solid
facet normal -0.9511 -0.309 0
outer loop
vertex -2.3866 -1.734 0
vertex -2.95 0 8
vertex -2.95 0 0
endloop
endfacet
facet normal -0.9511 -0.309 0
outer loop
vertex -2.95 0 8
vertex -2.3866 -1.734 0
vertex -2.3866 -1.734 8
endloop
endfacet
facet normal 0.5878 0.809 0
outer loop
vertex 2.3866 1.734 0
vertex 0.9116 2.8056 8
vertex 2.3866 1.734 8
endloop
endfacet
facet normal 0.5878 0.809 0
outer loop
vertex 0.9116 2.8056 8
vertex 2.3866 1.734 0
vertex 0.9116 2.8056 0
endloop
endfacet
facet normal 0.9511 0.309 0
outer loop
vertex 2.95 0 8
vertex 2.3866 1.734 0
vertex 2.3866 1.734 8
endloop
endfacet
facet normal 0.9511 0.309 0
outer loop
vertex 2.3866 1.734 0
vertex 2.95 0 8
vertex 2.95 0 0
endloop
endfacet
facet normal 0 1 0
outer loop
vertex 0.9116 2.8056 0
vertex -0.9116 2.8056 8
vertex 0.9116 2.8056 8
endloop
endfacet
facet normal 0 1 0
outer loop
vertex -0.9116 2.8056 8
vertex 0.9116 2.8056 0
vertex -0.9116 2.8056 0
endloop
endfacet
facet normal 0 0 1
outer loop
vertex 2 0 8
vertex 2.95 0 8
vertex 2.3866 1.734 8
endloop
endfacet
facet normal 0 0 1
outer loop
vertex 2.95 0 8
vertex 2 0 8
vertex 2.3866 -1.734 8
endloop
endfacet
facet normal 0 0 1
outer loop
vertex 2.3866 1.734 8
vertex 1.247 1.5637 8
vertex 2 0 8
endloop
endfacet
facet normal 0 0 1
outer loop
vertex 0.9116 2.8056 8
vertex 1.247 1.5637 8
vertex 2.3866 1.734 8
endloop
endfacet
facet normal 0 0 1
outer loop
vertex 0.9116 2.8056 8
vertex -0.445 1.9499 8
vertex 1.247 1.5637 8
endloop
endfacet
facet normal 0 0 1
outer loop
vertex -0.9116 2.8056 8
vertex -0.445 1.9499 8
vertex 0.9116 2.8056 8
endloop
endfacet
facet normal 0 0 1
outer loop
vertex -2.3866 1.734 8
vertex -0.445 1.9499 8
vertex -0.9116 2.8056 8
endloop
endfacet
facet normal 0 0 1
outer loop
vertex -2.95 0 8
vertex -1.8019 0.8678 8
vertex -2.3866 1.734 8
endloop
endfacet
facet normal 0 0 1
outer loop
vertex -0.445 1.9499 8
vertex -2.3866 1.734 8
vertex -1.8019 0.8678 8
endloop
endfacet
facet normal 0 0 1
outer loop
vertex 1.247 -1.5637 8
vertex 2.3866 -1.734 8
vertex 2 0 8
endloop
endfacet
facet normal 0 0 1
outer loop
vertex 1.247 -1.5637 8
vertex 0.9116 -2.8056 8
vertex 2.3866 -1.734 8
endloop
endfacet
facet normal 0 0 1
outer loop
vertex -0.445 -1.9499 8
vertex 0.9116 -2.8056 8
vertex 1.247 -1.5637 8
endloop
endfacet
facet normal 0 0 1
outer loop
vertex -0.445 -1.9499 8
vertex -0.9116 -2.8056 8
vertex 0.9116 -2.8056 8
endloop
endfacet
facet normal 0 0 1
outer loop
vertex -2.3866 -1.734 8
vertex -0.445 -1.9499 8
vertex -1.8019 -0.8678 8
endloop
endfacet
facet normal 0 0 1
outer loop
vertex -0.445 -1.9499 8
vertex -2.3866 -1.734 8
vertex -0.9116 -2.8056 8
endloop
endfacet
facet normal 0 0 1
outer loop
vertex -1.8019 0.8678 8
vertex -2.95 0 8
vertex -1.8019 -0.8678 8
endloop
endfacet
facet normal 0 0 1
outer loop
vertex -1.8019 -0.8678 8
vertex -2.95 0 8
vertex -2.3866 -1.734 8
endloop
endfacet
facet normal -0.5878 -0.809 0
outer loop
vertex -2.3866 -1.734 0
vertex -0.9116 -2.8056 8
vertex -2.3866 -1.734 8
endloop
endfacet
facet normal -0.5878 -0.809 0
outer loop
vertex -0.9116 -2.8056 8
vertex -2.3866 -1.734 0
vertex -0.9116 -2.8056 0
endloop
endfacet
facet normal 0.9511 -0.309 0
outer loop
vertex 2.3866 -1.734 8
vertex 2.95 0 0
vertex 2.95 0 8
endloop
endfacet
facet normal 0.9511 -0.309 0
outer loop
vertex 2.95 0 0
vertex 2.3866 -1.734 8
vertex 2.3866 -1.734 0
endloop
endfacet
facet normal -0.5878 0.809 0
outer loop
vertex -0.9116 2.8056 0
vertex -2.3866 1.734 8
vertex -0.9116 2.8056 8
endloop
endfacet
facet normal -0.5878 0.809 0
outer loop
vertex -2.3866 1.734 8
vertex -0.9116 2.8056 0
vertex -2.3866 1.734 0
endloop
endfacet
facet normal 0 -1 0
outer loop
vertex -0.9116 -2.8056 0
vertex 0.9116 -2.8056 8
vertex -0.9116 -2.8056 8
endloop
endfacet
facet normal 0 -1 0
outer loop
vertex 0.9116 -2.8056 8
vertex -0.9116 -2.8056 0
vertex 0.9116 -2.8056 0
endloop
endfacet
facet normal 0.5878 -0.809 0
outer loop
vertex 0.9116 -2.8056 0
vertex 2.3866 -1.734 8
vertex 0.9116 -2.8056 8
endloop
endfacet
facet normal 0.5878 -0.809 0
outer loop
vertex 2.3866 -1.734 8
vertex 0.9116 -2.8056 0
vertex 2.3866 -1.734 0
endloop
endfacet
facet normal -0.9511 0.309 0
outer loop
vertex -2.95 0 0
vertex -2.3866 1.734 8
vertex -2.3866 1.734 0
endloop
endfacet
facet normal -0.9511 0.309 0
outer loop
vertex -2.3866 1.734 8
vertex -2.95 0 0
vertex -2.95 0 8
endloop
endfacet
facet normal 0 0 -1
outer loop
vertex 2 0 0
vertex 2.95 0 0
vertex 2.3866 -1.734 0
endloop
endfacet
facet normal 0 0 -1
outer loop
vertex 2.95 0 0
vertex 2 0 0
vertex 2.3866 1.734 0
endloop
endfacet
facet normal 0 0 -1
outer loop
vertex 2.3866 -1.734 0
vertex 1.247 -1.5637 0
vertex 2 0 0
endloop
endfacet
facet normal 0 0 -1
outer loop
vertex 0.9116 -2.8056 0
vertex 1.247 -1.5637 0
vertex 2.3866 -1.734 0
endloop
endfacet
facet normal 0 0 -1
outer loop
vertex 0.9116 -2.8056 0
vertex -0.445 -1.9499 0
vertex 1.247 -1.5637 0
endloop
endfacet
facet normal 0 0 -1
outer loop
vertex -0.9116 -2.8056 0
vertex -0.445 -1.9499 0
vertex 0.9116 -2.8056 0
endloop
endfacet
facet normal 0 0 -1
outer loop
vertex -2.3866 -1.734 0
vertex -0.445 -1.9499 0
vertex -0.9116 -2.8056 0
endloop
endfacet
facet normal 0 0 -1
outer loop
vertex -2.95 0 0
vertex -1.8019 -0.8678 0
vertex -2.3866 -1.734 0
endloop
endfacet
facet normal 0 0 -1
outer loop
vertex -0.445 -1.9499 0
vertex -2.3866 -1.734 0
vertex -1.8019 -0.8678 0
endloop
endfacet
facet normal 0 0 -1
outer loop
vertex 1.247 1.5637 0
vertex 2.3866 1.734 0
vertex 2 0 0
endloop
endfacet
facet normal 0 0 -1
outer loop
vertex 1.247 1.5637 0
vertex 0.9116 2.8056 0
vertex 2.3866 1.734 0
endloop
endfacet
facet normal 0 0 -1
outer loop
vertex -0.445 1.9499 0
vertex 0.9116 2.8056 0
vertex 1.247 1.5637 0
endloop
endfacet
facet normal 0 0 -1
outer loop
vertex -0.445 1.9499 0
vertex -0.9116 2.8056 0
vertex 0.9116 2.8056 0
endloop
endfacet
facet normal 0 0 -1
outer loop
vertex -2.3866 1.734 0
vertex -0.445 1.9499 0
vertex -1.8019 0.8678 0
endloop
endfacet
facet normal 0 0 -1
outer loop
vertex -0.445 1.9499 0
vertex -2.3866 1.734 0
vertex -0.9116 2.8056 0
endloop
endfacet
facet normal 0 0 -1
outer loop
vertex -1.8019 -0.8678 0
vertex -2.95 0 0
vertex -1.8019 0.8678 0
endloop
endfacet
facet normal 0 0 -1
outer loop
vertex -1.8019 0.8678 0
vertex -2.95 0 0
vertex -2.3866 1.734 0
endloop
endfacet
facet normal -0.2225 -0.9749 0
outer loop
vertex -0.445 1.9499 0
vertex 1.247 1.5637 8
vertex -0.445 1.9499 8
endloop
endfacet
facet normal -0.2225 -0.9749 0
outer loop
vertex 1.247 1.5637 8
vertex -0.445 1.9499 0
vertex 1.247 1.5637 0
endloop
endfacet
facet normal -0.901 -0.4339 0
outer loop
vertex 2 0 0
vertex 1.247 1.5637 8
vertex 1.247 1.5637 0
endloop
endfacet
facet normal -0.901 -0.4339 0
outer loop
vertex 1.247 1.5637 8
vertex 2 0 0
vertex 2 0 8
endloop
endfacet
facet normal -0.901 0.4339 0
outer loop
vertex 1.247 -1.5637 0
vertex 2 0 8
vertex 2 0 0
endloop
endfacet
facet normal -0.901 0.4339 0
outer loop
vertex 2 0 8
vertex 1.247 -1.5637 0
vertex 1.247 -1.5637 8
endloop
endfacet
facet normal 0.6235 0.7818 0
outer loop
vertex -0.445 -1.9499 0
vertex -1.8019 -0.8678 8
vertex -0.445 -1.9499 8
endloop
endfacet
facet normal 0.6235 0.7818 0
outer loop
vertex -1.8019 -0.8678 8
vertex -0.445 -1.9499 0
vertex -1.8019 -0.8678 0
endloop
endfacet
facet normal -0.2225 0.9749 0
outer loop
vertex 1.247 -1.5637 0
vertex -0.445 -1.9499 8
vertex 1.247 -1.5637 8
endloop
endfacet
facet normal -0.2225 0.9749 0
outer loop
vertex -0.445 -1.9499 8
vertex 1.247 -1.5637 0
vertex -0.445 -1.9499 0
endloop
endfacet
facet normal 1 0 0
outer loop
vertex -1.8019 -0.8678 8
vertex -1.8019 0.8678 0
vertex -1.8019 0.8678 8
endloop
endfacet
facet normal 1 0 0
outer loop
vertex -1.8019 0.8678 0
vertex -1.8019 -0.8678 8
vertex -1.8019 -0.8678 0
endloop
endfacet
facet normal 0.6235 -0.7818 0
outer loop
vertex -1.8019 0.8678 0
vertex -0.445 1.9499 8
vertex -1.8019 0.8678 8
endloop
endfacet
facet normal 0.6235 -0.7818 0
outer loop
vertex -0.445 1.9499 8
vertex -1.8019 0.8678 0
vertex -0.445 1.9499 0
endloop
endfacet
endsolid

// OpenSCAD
// file: project.scad
housing_h = 35;
bearing_h  = 20;
insert_h = 8;
insert_pcd = 37.5;

hole_eps = 0.02;
hole_start_eps = 0.01;

boss_holes = [50, 50];
boss_flange_thk = 10;

module thru_hole() {
    translate([0, 0, -hole_start_eps]) children();
}
// main file
include <project.scad>

module insert() {
    color("gold") difference() {
        union() {
            cylinder(d=5.9, h=insert_h);
        }
        cylinder(d=4, h=insert_h+hole_eps);
    }
}

insert();
